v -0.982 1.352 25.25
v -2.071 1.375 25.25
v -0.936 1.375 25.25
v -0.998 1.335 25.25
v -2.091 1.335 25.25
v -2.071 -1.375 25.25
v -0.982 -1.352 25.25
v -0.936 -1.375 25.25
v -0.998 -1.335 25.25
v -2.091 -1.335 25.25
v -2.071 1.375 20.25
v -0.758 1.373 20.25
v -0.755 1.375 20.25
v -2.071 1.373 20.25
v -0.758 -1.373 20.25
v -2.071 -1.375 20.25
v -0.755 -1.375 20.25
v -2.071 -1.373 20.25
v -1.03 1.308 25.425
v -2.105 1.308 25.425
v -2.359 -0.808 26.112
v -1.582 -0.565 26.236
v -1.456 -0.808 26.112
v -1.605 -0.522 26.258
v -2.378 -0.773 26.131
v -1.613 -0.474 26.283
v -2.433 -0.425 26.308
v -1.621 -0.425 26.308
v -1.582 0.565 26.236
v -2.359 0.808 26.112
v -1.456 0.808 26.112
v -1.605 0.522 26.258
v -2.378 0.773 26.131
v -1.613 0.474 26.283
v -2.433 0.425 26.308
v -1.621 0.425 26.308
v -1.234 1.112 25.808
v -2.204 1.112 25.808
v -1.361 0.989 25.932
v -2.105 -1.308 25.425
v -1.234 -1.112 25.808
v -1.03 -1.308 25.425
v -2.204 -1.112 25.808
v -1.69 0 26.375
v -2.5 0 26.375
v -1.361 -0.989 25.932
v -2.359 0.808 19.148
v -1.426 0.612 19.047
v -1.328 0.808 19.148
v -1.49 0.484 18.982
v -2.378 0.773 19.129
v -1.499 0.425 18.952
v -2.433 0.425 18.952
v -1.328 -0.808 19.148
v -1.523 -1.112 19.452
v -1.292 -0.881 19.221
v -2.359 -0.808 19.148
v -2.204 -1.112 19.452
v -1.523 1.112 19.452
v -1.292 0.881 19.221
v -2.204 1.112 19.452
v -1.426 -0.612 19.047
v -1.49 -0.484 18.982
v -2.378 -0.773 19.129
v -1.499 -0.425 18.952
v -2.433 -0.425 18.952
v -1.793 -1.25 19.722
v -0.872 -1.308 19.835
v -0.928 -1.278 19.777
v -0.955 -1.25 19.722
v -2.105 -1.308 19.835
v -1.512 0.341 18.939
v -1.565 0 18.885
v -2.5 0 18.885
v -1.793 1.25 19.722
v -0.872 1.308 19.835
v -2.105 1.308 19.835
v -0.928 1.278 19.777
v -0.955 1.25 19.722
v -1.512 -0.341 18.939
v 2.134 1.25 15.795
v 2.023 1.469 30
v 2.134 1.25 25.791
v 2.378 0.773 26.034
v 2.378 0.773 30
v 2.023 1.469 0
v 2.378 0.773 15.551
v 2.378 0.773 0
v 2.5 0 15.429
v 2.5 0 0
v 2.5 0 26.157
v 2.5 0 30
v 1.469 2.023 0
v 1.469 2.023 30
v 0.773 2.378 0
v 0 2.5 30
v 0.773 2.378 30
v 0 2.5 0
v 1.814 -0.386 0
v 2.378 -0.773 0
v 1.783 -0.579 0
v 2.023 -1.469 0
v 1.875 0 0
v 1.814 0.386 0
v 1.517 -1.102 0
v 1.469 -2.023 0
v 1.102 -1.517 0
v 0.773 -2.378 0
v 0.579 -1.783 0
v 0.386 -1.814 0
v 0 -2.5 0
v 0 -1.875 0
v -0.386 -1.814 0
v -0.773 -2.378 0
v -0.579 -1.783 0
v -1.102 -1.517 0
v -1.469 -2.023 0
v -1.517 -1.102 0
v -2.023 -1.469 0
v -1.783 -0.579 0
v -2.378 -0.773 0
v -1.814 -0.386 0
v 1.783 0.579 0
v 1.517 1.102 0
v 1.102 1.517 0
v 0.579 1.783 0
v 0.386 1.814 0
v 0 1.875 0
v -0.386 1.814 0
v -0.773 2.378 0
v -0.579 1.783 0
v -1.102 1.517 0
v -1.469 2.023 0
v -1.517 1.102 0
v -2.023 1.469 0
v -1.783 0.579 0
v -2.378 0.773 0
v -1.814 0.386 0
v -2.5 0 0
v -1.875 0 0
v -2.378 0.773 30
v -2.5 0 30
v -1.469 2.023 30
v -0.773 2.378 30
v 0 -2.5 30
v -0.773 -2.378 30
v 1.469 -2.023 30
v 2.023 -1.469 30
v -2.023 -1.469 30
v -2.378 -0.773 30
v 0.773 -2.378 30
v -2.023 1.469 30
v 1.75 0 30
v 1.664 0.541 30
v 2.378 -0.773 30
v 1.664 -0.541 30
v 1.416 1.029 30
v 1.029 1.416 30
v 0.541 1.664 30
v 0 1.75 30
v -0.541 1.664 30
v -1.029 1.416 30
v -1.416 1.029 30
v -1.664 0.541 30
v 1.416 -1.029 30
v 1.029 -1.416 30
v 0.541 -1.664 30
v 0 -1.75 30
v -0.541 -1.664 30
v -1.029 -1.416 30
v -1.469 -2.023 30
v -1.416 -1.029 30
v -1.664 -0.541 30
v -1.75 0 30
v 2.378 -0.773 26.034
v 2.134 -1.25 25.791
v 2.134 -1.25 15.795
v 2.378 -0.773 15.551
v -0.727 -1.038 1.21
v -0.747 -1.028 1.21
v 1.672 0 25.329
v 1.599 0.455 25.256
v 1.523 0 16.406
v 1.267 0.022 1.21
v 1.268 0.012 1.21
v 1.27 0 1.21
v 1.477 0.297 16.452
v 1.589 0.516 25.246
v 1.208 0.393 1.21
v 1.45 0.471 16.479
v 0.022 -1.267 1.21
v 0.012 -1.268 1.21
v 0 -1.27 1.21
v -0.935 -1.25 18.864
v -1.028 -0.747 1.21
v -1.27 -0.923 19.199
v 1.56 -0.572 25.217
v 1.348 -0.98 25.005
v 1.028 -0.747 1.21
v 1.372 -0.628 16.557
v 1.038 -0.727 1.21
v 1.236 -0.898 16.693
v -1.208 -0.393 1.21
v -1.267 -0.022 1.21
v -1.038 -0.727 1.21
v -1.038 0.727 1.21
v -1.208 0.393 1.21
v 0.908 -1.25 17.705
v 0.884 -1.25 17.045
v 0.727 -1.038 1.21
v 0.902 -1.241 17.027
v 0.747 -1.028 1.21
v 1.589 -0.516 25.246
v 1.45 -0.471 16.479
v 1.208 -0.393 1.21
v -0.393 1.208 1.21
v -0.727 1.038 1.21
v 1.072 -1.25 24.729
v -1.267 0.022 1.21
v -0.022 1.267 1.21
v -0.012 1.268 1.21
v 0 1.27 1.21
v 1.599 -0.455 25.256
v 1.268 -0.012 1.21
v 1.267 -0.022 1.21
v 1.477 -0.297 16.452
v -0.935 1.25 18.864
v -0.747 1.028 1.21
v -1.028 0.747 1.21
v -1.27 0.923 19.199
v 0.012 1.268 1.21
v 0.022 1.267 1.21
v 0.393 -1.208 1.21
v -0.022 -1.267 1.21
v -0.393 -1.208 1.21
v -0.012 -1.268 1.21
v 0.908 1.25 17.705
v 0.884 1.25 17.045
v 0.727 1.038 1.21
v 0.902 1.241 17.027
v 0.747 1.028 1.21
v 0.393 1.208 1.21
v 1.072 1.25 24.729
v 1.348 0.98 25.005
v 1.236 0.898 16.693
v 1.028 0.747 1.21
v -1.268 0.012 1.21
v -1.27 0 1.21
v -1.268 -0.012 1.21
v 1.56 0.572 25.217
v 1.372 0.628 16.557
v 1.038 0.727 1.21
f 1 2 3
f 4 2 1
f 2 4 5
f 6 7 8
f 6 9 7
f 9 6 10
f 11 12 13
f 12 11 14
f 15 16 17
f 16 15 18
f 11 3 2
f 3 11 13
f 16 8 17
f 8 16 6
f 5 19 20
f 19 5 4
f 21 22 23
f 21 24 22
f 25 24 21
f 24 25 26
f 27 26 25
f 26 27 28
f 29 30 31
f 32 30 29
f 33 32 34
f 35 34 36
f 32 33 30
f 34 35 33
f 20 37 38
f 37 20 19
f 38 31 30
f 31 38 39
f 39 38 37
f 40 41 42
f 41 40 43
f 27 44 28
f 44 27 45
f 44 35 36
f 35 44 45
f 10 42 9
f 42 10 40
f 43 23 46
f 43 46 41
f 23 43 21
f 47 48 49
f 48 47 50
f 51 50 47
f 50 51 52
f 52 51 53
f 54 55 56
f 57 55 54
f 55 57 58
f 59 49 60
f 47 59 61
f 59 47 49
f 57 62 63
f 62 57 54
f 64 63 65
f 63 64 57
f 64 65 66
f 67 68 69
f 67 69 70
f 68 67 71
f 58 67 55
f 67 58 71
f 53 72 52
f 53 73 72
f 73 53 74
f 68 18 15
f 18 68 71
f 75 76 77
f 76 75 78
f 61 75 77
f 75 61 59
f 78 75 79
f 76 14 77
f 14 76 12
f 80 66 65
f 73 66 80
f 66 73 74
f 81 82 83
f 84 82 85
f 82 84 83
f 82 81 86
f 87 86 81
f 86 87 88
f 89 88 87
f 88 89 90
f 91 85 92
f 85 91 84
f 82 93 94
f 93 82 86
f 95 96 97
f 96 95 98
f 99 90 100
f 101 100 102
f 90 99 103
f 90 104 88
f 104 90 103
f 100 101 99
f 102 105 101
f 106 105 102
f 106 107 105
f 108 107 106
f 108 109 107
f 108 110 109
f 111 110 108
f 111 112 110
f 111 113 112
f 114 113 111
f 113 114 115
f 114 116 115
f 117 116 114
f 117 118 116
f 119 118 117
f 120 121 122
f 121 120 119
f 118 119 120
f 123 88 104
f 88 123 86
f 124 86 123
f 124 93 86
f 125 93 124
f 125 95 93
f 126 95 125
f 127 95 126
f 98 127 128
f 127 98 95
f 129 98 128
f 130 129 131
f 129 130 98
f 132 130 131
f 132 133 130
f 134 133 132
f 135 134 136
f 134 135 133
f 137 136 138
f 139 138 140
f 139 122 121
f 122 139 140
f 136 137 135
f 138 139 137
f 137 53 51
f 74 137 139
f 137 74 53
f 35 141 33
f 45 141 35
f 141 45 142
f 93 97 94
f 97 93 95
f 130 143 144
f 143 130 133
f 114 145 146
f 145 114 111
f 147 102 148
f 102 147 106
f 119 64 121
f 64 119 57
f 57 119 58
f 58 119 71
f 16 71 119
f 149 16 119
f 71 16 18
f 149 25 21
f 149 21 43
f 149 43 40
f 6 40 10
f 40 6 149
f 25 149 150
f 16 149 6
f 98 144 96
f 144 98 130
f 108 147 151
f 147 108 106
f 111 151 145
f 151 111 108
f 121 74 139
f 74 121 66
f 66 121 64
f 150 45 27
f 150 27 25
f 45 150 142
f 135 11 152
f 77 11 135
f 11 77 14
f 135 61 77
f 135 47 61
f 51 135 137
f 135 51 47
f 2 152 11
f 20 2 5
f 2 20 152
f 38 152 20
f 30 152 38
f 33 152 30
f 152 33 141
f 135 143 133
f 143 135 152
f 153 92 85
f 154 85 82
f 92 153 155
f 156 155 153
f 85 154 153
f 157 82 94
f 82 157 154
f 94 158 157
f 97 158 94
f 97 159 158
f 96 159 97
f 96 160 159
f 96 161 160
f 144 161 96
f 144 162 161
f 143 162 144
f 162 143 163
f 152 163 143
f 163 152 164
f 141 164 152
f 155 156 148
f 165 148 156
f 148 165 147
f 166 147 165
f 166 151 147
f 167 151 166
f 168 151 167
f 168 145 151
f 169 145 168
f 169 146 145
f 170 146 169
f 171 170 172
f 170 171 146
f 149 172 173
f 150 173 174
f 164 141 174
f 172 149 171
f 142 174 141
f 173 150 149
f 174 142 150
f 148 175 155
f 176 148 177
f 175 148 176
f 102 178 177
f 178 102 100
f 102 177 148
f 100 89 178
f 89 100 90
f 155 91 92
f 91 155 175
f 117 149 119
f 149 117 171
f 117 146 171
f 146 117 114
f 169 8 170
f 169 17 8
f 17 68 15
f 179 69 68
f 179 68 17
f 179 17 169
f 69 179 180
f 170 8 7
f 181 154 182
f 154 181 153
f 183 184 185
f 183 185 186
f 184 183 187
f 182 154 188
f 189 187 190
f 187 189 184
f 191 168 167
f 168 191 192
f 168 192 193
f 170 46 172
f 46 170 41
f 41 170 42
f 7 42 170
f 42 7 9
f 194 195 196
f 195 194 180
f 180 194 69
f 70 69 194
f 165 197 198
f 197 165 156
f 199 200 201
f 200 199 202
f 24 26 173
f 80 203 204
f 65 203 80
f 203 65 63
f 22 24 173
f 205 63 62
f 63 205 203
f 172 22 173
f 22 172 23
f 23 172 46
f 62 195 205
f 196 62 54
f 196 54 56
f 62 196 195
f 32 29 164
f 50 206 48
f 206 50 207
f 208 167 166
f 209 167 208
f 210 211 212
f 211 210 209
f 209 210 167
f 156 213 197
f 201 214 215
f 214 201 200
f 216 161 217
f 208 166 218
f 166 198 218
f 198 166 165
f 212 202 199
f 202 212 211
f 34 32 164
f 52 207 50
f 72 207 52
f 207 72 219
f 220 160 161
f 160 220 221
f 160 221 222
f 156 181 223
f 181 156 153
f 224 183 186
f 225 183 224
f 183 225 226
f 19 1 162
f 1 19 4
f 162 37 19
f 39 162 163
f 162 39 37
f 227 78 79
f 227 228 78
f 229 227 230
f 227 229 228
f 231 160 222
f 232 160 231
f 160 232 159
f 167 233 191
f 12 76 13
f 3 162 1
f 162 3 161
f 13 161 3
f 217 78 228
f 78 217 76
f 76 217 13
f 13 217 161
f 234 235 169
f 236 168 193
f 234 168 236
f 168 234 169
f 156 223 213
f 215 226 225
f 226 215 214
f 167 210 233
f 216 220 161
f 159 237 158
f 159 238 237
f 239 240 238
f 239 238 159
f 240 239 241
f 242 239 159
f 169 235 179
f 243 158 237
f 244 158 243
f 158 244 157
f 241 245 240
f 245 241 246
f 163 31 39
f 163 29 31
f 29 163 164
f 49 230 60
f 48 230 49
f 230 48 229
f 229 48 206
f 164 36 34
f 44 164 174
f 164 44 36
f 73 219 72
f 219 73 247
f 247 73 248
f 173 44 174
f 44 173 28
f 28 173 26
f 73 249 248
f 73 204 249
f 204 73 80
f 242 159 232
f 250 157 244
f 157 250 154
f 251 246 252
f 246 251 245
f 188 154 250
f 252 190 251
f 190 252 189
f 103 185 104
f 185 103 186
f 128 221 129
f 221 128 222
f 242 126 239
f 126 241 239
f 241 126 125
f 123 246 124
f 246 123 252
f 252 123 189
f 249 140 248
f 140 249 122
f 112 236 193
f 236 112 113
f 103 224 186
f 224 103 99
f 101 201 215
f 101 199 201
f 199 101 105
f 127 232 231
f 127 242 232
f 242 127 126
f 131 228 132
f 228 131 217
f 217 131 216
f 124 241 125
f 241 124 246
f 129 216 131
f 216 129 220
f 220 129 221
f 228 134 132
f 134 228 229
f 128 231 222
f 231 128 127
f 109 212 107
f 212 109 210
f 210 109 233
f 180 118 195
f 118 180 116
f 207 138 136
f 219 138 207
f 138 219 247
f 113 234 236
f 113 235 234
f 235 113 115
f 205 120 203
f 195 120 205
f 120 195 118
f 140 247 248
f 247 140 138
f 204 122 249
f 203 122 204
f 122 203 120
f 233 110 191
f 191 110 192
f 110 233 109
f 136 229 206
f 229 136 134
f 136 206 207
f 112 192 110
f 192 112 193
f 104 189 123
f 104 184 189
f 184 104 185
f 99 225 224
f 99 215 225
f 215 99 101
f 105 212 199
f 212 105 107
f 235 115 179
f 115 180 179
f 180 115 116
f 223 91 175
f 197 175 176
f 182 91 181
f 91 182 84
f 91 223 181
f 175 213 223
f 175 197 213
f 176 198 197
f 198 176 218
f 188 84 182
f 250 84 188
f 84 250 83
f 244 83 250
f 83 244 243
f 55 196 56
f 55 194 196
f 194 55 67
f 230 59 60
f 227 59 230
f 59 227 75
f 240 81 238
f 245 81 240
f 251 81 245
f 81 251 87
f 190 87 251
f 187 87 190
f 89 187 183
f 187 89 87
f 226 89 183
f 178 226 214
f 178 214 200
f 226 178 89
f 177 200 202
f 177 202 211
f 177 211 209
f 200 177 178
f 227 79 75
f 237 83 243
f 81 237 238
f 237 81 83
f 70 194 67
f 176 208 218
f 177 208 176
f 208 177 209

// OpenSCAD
/*
Title: TWST Baffle
Copyright: Jet Flener 2024
Author: Jet Flener - jetflener@ou.edu
License: n/a
Encoding: UTF-8
Version: 0.1.0-alpha
Description: A modified baffle for the TWST machine, for use with the blow dryer fan attachment.
*/



module baffleBase(){
    cylinder(h = 30, r = 2.5, center = true);
    $fn = 20;
}
module baffleTop(){
    cylinder(h = 2.5, d1 = 2.5, d2 = 5, center = true); 
    $fn = 20;
}
module baffleBot(){
    cylinder(h = 2.5, d1 = 5, d2 = 2.5, center = true); 
    $fn = 20;
}
module baffleInner(){
    cylinder(30, 1.25, 1.75, true);
    $fn = 20;
}
module fanHole(){
    union(){
        translate([0, 0, 7.75])cube([2.5, 2.75, 5], center = true);
    
       translate([-1.25, 0, 10]) rotate([90, 0, 90]) cylinder(2.5, r = 1.375, true);
        translate([-1.25, 0, 5.26]) rotate([90, 0, 90]) cylinder(2.5, r = 1.375, true);
    }
    $fn = 20;

}
module ventHole(){
    translate([0, 0, -1])rotate([0, -45, 0])cube([10, 2.5, 8], center = true);
    $fn = 20;
}

module baffle(){
    difference(){
        baffleBase();
        baffleInner();
        //translate([0, 0, 15])baffleTop();
        translate([0, 0, -15])baffleBot();   
        
        // fan holes
        translate([-1.25,0,0])fanHole();
  
        //vent holes
        translate([3.5,0,7.5])ventHole();

    }
}


//need to add connection plate for duct, measure it out too

module ventSide(){
    translate([3.5, 0, 0])   rotate([0, 0, 90]) intersection() {
	baffle();
	translate([1.25, 0, 0]) cube ([2.5, 5, 30], center = true);
    }
}

module fanSide() {
    translate([-3.5, 0, 0])  rotate([0, 0, -90]) intersection() {
	baffle();
	translate([-1.25, 0, 0]) cube ([2.5, 5, 30], center = true);
    }
}




module dF() {
    render(){
       translate ([0, 0, 15]) fanSide();
    }
}

module dV() {
    render(){
        translate ([0, 0, 15]) ventSide();
    }
}

module dB() {
    render(){
       translate ([0, 0, 15]) baffle();
    }
}


//dF();
//dV();
dB();
